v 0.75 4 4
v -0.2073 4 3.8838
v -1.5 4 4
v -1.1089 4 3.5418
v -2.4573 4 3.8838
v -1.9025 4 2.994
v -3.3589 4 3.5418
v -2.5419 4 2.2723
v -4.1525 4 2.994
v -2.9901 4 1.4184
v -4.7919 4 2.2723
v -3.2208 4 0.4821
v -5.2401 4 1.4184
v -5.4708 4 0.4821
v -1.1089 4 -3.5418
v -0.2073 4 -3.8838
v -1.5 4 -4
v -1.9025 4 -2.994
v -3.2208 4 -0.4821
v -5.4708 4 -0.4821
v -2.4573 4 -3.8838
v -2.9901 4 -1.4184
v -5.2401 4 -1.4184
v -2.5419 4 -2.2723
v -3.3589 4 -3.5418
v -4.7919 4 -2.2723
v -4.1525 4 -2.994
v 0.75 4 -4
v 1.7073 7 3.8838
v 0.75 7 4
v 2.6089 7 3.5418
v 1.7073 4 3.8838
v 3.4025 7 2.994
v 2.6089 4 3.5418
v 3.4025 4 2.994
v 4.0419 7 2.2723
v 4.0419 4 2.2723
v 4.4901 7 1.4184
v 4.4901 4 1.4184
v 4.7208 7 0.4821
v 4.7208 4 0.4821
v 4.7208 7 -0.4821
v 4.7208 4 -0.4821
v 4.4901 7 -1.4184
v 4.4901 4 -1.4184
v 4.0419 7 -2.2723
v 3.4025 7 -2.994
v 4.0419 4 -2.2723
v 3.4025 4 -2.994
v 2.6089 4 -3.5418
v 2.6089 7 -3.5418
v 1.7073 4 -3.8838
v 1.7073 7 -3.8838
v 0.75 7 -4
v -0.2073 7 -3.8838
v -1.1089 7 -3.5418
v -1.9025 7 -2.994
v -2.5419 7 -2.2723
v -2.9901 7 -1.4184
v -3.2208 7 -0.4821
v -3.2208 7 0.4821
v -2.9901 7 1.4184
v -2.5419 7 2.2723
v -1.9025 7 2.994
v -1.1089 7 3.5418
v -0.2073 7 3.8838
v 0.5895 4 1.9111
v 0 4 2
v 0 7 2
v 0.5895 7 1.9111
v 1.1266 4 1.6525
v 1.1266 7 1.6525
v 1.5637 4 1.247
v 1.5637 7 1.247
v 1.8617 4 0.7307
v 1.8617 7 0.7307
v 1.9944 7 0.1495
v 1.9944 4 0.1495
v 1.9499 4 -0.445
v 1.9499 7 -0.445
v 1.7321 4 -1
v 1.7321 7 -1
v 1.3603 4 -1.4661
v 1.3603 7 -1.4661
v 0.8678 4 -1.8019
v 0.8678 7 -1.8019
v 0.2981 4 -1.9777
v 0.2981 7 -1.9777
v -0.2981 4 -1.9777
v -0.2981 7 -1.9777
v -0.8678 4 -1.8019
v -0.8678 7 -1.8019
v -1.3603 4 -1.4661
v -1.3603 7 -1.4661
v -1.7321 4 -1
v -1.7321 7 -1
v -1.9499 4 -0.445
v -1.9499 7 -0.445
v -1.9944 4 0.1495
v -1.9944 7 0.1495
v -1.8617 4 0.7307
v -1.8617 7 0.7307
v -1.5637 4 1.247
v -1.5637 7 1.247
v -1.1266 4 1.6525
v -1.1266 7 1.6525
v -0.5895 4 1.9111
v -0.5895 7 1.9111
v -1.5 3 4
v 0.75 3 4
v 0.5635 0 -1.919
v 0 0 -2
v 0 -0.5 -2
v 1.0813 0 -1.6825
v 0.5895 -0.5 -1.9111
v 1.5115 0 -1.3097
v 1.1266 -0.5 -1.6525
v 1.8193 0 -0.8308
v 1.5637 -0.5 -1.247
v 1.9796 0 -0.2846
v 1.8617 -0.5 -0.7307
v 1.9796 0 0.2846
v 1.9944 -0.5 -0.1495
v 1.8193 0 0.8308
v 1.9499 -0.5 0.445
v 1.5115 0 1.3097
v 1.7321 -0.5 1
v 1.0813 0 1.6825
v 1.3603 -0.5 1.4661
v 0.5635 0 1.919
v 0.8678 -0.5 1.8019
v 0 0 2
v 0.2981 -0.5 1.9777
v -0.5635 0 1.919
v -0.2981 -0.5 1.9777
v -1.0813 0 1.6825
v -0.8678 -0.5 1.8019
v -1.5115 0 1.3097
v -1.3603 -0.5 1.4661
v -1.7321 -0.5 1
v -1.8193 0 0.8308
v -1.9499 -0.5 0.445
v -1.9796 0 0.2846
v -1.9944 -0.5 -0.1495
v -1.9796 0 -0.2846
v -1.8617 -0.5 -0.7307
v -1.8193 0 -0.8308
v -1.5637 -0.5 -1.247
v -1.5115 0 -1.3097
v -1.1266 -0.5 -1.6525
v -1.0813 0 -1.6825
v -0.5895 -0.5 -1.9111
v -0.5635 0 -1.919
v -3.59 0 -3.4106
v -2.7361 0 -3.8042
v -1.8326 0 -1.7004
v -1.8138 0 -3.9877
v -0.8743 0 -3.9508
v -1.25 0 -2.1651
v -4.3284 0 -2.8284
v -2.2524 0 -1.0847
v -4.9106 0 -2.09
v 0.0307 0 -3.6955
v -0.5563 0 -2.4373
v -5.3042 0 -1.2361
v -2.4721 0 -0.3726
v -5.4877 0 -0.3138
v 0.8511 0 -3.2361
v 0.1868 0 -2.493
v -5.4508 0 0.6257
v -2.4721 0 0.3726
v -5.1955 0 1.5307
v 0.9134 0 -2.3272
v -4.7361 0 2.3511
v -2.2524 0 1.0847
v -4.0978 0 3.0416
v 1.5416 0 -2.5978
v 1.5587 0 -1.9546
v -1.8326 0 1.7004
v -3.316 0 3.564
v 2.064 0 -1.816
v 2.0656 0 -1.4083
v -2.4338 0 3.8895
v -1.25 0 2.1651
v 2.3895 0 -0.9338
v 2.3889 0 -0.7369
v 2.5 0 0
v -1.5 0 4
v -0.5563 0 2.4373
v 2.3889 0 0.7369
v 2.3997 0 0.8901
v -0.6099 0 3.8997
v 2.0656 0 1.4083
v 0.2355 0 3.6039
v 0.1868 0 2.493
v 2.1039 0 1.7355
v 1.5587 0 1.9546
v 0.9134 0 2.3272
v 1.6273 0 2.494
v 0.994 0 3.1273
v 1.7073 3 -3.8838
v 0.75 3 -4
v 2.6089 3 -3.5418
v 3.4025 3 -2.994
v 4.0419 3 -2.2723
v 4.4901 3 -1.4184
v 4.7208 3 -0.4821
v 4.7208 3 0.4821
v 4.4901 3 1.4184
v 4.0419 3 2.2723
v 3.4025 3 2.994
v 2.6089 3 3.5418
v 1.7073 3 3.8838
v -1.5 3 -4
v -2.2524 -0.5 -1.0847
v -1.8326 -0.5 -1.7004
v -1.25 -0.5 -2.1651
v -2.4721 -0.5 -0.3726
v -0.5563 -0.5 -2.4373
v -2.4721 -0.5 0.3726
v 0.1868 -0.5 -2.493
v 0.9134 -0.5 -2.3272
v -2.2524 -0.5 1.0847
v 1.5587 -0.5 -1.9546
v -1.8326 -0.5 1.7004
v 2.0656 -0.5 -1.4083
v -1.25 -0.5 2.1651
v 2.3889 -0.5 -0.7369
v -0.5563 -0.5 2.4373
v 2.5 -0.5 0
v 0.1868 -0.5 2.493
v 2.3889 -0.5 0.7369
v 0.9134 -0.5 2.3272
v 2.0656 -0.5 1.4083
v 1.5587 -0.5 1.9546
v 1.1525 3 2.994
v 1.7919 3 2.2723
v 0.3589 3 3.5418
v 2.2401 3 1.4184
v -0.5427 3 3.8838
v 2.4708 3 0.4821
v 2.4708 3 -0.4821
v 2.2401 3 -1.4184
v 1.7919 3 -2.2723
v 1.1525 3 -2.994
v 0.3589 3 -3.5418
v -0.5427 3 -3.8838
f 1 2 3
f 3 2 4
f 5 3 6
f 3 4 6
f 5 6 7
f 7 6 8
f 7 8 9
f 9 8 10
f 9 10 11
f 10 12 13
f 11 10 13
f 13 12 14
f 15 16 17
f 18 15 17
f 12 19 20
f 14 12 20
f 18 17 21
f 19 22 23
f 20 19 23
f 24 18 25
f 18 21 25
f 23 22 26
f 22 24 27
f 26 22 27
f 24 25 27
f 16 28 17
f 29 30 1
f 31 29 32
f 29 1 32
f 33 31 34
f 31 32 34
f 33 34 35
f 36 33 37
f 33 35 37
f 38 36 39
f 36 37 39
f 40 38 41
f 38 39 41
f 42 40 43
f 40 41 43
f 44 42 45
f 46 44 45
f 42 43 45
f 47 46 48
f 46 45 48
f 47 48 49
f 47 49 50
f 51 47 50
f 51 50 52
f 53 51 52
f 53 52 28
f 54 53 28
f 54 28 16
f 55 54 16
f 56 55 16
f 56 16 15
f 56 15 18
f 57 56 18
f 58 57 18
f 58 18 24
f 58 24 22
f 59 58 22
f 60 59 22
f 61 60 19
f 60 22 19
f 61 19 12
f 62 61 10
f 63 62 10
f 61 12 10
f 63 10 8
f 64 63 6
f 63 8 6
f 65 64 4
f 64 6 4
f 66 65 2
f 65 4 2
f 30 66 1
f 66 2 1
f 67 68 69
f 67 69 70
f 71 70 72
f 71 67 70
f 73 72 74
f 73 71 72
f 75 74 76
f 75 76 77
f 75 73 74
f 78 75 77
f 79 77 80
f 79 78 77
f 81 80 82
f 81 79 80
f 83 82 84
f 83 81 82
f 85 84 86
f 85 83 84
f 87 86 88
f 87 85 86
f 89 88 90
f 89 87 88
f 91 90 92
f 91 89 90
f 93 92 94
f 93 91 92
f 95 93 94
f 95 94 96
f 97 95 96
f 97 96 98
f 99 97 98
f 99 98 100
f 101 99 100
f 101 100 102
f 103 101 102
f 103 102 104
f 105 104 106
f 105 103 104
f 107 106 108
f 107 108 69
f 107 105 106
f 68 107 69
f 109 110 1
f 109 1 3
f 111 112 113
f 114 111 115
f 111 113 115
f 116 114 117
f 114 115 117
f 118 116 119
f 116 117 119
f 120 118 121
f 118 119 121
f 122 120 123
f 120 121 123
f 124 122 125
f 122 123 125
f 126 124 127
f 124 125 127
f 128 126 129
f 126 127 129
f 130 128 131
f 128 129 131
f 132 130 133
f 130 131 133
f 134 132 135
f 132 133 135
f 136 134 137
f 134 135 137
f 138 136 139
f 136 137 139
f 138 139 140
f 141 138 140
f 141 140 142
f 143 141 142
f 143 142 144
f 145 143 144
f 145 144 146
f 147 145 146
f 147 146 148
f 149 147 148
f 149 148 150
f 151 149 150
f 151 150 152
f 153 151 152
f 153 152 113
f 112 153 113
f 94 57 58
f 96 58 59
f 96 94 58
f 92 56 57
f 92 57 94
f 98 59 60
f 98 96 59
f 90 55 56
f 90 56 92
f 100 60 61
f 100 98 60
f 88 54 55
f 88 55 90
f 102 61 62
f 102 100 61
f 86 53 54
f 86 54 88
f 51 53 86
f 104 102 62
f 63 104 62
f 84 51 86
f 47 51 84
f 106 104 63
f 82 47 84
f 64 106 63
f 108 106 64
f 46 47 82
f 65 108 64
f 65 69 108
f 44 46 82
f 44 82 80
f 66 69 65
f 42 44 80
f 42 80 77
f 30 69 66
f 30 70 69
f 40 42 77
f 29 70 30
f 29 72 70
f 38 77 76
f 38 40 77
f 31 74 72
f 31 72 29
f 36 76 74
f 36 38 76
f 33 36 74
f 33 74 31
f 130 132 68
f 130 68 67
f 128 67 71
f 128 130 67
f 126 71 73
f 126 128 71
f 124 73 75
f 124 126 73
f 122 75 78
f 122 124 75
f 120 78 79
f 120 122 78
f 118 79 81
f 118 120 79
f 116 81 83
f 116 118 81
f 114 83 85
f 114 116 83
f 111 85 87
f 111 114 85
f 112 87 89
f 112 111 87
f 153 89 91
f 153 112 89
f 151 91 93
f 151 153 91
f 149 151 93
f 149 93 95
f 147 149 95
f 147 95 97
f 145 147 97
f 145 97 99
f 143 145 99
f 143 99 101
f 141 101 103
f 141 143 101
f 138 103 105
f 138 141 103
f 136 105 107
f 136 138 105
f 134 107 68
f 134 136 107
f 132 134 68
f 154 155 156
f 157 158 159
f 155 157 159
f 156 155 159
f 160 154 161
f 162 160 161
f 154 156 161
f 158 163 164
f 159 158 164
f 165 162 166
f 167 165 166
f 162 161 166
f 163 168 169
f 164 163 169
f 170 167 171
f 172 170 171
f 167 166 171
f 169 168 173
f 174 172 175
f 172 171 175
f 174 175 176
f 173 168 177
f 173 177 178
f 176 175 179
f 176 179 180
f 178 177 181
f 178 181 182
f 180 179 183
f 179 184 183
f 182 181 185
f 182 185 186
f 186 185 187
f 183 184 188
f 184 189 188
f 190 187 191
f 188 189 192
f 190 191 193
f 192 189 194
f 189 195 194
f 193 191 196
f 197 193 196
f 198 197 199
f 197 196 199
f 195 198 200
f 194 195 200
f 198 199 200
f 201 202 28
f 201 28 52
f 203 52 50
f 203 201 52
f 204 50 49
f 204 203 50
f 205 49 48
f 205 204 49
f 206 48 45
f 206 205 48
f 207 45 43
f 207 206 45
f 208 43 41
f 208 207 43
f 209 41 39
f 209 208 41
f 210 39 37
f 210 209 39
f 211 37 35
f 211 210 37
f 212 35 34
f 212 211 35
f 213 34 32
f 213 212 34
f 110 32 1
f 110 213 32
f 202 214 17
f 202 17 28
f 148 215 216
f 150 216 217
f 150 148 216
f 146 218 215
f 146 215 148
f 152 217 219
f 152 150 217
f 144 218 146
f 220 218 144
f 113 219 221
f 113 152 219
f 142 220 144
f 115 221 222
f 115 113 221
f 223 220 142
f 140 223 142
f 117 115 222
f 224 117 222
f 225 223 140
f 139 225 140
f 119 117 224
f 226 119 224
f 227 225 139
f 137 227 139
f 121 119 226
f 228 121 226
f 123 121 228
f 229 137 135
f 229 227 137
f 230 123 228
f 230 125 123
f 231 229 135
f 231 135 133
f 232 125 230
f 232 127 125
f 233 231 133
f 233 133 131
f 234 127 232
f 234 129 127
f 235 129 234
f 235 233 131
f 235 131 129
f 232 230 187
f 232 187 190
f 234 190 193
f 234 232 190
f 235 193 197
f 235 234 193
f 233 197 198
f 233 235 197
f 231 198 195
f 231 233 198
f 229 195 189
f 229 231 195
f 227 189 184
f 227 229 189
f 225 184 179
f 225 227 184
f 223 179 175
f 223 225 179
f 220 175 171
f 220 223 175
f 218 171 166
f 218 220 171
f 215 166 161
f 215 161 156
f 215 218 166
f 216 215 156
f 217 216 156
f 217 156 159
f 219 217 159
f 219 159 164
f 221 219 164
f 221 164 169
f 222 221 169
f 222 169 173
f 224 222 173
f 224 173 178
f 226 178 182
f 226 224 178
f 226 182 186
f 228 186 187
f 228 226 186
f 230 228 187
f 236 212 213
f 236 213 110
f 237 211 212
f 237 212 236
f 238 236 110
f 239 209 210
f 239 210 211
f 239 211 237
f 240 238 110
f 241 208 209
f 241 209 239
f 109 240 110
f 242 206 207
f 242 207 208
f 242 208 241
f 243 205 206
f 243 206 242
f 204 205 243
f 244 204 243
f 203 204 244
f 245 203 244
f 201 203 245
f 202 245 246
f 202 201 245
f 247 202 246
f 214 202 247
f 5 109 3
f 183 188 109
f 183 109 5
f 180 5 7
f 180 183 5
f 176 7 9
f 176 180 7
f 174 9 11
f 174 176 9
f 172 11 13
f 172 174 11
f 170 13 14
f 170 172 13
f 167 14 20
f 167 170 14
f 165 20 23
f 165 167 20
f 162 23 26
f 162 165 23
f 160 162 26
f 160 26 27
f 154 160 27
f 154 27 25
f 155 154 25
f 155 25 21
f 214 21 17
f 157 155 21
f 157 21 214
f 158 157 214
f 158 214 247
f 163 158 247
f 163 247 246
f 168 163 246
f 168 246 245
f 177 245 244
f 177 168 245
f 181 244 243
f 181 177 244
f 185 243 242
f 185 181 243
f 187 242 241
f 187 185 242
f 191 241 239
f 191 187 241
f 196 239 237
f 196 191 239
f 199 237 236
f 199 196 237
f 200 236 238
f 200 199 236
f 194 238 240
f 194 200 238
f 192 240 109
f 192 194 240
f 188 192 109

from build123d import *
from build123d.topology import SkipClean

# Parameters (mm, degrees)
SKETCH_1_R      = 4
SKETCH_1_R_2    = 2
EXTRUDE_1_DEPTH = 3
SKETCH_2_R      = 2
EXTRUDE_2_DEPTH = 1
SKETCH_3_R      = 4
SKETCH_3_R_2    = 2
EXTRUDE_3_DEPTH = 3
EXTRUDE_START   = 0.5
SKETCH_4_R      = 2.5
SKETCH_4_R_2    = 2
EXTRUDE_4_DEPTH = 0.5


with BuildPart() as part:
    # 草图1 → 凸台-拉伸1 (new body)
    with BuildSketch(Plane(origin=(0, 0, 0), x_dir=(1, 0, 0), z_dir=(0, 1, 0))):
        with Locations((-1.5, 0)):
            Circle(SKETCH_1_R)
        Circle(SKETCH_1_R_2, mode=Mode.SUBTRACT)
    extrude(amount=EXTRUDE_1_DEPTH)

    # 草图2 → 凸台-拉伸2 (add)
    with BuildSketch(Plane(origin=(0, 3, 0), x_dir=(1, 0, 0), z_dir=(0, 1, 0))):
        with BuildLine():
            Line((-1.5, 4), (0.75, 4))
            ThreePointArc((0.75, 4), (4.75, 0), (0.75, -4))
            Line((0.75, -4), (-1.5, -4))
            ThreePointArc((-1.5, -4), (-5.5, 0), (-1.5, 4))
        make_face()
        Circle(SKETCH_2_R, mode=Mode.SUBTRACT)
    extrude(amount=EXTRUDE_2_DEPTH)

    # 草图3 → 凸台-拉伸3 (add)
    with SkipClean():  # the faces are left unmerged after this step: merging them gives an invalid solid
        with BuildSketch(Plane(origin=(0, 4, 0), x_dir=(1, 0, 0), z_dir=(0, 1, 0))):
            with Locations((0.75, 0)):
                Circle(SKETCH_3_R)
            Circle(SKETCH_3_R_2, mode=Mode.SUBTRACT)
        extrude(amount=EXTRUDE_3_DEPTH)
    add(part.part.scale(1), mode=Mode.REPLACE)  # the faces are merged on a copy

    # 草图4 → 凸台-拉伸4 (add)
    with BuildSketch(Plane.XZ.offset(EXTRUDE_START)):
        Circle(SKETCH_4_R)
        Circle(SKETCH_4_R_2, mode=Mode.SUBTRACT)
    extrude(amount=-EXTRUDE_4_DEPTH)


solid = part.part
